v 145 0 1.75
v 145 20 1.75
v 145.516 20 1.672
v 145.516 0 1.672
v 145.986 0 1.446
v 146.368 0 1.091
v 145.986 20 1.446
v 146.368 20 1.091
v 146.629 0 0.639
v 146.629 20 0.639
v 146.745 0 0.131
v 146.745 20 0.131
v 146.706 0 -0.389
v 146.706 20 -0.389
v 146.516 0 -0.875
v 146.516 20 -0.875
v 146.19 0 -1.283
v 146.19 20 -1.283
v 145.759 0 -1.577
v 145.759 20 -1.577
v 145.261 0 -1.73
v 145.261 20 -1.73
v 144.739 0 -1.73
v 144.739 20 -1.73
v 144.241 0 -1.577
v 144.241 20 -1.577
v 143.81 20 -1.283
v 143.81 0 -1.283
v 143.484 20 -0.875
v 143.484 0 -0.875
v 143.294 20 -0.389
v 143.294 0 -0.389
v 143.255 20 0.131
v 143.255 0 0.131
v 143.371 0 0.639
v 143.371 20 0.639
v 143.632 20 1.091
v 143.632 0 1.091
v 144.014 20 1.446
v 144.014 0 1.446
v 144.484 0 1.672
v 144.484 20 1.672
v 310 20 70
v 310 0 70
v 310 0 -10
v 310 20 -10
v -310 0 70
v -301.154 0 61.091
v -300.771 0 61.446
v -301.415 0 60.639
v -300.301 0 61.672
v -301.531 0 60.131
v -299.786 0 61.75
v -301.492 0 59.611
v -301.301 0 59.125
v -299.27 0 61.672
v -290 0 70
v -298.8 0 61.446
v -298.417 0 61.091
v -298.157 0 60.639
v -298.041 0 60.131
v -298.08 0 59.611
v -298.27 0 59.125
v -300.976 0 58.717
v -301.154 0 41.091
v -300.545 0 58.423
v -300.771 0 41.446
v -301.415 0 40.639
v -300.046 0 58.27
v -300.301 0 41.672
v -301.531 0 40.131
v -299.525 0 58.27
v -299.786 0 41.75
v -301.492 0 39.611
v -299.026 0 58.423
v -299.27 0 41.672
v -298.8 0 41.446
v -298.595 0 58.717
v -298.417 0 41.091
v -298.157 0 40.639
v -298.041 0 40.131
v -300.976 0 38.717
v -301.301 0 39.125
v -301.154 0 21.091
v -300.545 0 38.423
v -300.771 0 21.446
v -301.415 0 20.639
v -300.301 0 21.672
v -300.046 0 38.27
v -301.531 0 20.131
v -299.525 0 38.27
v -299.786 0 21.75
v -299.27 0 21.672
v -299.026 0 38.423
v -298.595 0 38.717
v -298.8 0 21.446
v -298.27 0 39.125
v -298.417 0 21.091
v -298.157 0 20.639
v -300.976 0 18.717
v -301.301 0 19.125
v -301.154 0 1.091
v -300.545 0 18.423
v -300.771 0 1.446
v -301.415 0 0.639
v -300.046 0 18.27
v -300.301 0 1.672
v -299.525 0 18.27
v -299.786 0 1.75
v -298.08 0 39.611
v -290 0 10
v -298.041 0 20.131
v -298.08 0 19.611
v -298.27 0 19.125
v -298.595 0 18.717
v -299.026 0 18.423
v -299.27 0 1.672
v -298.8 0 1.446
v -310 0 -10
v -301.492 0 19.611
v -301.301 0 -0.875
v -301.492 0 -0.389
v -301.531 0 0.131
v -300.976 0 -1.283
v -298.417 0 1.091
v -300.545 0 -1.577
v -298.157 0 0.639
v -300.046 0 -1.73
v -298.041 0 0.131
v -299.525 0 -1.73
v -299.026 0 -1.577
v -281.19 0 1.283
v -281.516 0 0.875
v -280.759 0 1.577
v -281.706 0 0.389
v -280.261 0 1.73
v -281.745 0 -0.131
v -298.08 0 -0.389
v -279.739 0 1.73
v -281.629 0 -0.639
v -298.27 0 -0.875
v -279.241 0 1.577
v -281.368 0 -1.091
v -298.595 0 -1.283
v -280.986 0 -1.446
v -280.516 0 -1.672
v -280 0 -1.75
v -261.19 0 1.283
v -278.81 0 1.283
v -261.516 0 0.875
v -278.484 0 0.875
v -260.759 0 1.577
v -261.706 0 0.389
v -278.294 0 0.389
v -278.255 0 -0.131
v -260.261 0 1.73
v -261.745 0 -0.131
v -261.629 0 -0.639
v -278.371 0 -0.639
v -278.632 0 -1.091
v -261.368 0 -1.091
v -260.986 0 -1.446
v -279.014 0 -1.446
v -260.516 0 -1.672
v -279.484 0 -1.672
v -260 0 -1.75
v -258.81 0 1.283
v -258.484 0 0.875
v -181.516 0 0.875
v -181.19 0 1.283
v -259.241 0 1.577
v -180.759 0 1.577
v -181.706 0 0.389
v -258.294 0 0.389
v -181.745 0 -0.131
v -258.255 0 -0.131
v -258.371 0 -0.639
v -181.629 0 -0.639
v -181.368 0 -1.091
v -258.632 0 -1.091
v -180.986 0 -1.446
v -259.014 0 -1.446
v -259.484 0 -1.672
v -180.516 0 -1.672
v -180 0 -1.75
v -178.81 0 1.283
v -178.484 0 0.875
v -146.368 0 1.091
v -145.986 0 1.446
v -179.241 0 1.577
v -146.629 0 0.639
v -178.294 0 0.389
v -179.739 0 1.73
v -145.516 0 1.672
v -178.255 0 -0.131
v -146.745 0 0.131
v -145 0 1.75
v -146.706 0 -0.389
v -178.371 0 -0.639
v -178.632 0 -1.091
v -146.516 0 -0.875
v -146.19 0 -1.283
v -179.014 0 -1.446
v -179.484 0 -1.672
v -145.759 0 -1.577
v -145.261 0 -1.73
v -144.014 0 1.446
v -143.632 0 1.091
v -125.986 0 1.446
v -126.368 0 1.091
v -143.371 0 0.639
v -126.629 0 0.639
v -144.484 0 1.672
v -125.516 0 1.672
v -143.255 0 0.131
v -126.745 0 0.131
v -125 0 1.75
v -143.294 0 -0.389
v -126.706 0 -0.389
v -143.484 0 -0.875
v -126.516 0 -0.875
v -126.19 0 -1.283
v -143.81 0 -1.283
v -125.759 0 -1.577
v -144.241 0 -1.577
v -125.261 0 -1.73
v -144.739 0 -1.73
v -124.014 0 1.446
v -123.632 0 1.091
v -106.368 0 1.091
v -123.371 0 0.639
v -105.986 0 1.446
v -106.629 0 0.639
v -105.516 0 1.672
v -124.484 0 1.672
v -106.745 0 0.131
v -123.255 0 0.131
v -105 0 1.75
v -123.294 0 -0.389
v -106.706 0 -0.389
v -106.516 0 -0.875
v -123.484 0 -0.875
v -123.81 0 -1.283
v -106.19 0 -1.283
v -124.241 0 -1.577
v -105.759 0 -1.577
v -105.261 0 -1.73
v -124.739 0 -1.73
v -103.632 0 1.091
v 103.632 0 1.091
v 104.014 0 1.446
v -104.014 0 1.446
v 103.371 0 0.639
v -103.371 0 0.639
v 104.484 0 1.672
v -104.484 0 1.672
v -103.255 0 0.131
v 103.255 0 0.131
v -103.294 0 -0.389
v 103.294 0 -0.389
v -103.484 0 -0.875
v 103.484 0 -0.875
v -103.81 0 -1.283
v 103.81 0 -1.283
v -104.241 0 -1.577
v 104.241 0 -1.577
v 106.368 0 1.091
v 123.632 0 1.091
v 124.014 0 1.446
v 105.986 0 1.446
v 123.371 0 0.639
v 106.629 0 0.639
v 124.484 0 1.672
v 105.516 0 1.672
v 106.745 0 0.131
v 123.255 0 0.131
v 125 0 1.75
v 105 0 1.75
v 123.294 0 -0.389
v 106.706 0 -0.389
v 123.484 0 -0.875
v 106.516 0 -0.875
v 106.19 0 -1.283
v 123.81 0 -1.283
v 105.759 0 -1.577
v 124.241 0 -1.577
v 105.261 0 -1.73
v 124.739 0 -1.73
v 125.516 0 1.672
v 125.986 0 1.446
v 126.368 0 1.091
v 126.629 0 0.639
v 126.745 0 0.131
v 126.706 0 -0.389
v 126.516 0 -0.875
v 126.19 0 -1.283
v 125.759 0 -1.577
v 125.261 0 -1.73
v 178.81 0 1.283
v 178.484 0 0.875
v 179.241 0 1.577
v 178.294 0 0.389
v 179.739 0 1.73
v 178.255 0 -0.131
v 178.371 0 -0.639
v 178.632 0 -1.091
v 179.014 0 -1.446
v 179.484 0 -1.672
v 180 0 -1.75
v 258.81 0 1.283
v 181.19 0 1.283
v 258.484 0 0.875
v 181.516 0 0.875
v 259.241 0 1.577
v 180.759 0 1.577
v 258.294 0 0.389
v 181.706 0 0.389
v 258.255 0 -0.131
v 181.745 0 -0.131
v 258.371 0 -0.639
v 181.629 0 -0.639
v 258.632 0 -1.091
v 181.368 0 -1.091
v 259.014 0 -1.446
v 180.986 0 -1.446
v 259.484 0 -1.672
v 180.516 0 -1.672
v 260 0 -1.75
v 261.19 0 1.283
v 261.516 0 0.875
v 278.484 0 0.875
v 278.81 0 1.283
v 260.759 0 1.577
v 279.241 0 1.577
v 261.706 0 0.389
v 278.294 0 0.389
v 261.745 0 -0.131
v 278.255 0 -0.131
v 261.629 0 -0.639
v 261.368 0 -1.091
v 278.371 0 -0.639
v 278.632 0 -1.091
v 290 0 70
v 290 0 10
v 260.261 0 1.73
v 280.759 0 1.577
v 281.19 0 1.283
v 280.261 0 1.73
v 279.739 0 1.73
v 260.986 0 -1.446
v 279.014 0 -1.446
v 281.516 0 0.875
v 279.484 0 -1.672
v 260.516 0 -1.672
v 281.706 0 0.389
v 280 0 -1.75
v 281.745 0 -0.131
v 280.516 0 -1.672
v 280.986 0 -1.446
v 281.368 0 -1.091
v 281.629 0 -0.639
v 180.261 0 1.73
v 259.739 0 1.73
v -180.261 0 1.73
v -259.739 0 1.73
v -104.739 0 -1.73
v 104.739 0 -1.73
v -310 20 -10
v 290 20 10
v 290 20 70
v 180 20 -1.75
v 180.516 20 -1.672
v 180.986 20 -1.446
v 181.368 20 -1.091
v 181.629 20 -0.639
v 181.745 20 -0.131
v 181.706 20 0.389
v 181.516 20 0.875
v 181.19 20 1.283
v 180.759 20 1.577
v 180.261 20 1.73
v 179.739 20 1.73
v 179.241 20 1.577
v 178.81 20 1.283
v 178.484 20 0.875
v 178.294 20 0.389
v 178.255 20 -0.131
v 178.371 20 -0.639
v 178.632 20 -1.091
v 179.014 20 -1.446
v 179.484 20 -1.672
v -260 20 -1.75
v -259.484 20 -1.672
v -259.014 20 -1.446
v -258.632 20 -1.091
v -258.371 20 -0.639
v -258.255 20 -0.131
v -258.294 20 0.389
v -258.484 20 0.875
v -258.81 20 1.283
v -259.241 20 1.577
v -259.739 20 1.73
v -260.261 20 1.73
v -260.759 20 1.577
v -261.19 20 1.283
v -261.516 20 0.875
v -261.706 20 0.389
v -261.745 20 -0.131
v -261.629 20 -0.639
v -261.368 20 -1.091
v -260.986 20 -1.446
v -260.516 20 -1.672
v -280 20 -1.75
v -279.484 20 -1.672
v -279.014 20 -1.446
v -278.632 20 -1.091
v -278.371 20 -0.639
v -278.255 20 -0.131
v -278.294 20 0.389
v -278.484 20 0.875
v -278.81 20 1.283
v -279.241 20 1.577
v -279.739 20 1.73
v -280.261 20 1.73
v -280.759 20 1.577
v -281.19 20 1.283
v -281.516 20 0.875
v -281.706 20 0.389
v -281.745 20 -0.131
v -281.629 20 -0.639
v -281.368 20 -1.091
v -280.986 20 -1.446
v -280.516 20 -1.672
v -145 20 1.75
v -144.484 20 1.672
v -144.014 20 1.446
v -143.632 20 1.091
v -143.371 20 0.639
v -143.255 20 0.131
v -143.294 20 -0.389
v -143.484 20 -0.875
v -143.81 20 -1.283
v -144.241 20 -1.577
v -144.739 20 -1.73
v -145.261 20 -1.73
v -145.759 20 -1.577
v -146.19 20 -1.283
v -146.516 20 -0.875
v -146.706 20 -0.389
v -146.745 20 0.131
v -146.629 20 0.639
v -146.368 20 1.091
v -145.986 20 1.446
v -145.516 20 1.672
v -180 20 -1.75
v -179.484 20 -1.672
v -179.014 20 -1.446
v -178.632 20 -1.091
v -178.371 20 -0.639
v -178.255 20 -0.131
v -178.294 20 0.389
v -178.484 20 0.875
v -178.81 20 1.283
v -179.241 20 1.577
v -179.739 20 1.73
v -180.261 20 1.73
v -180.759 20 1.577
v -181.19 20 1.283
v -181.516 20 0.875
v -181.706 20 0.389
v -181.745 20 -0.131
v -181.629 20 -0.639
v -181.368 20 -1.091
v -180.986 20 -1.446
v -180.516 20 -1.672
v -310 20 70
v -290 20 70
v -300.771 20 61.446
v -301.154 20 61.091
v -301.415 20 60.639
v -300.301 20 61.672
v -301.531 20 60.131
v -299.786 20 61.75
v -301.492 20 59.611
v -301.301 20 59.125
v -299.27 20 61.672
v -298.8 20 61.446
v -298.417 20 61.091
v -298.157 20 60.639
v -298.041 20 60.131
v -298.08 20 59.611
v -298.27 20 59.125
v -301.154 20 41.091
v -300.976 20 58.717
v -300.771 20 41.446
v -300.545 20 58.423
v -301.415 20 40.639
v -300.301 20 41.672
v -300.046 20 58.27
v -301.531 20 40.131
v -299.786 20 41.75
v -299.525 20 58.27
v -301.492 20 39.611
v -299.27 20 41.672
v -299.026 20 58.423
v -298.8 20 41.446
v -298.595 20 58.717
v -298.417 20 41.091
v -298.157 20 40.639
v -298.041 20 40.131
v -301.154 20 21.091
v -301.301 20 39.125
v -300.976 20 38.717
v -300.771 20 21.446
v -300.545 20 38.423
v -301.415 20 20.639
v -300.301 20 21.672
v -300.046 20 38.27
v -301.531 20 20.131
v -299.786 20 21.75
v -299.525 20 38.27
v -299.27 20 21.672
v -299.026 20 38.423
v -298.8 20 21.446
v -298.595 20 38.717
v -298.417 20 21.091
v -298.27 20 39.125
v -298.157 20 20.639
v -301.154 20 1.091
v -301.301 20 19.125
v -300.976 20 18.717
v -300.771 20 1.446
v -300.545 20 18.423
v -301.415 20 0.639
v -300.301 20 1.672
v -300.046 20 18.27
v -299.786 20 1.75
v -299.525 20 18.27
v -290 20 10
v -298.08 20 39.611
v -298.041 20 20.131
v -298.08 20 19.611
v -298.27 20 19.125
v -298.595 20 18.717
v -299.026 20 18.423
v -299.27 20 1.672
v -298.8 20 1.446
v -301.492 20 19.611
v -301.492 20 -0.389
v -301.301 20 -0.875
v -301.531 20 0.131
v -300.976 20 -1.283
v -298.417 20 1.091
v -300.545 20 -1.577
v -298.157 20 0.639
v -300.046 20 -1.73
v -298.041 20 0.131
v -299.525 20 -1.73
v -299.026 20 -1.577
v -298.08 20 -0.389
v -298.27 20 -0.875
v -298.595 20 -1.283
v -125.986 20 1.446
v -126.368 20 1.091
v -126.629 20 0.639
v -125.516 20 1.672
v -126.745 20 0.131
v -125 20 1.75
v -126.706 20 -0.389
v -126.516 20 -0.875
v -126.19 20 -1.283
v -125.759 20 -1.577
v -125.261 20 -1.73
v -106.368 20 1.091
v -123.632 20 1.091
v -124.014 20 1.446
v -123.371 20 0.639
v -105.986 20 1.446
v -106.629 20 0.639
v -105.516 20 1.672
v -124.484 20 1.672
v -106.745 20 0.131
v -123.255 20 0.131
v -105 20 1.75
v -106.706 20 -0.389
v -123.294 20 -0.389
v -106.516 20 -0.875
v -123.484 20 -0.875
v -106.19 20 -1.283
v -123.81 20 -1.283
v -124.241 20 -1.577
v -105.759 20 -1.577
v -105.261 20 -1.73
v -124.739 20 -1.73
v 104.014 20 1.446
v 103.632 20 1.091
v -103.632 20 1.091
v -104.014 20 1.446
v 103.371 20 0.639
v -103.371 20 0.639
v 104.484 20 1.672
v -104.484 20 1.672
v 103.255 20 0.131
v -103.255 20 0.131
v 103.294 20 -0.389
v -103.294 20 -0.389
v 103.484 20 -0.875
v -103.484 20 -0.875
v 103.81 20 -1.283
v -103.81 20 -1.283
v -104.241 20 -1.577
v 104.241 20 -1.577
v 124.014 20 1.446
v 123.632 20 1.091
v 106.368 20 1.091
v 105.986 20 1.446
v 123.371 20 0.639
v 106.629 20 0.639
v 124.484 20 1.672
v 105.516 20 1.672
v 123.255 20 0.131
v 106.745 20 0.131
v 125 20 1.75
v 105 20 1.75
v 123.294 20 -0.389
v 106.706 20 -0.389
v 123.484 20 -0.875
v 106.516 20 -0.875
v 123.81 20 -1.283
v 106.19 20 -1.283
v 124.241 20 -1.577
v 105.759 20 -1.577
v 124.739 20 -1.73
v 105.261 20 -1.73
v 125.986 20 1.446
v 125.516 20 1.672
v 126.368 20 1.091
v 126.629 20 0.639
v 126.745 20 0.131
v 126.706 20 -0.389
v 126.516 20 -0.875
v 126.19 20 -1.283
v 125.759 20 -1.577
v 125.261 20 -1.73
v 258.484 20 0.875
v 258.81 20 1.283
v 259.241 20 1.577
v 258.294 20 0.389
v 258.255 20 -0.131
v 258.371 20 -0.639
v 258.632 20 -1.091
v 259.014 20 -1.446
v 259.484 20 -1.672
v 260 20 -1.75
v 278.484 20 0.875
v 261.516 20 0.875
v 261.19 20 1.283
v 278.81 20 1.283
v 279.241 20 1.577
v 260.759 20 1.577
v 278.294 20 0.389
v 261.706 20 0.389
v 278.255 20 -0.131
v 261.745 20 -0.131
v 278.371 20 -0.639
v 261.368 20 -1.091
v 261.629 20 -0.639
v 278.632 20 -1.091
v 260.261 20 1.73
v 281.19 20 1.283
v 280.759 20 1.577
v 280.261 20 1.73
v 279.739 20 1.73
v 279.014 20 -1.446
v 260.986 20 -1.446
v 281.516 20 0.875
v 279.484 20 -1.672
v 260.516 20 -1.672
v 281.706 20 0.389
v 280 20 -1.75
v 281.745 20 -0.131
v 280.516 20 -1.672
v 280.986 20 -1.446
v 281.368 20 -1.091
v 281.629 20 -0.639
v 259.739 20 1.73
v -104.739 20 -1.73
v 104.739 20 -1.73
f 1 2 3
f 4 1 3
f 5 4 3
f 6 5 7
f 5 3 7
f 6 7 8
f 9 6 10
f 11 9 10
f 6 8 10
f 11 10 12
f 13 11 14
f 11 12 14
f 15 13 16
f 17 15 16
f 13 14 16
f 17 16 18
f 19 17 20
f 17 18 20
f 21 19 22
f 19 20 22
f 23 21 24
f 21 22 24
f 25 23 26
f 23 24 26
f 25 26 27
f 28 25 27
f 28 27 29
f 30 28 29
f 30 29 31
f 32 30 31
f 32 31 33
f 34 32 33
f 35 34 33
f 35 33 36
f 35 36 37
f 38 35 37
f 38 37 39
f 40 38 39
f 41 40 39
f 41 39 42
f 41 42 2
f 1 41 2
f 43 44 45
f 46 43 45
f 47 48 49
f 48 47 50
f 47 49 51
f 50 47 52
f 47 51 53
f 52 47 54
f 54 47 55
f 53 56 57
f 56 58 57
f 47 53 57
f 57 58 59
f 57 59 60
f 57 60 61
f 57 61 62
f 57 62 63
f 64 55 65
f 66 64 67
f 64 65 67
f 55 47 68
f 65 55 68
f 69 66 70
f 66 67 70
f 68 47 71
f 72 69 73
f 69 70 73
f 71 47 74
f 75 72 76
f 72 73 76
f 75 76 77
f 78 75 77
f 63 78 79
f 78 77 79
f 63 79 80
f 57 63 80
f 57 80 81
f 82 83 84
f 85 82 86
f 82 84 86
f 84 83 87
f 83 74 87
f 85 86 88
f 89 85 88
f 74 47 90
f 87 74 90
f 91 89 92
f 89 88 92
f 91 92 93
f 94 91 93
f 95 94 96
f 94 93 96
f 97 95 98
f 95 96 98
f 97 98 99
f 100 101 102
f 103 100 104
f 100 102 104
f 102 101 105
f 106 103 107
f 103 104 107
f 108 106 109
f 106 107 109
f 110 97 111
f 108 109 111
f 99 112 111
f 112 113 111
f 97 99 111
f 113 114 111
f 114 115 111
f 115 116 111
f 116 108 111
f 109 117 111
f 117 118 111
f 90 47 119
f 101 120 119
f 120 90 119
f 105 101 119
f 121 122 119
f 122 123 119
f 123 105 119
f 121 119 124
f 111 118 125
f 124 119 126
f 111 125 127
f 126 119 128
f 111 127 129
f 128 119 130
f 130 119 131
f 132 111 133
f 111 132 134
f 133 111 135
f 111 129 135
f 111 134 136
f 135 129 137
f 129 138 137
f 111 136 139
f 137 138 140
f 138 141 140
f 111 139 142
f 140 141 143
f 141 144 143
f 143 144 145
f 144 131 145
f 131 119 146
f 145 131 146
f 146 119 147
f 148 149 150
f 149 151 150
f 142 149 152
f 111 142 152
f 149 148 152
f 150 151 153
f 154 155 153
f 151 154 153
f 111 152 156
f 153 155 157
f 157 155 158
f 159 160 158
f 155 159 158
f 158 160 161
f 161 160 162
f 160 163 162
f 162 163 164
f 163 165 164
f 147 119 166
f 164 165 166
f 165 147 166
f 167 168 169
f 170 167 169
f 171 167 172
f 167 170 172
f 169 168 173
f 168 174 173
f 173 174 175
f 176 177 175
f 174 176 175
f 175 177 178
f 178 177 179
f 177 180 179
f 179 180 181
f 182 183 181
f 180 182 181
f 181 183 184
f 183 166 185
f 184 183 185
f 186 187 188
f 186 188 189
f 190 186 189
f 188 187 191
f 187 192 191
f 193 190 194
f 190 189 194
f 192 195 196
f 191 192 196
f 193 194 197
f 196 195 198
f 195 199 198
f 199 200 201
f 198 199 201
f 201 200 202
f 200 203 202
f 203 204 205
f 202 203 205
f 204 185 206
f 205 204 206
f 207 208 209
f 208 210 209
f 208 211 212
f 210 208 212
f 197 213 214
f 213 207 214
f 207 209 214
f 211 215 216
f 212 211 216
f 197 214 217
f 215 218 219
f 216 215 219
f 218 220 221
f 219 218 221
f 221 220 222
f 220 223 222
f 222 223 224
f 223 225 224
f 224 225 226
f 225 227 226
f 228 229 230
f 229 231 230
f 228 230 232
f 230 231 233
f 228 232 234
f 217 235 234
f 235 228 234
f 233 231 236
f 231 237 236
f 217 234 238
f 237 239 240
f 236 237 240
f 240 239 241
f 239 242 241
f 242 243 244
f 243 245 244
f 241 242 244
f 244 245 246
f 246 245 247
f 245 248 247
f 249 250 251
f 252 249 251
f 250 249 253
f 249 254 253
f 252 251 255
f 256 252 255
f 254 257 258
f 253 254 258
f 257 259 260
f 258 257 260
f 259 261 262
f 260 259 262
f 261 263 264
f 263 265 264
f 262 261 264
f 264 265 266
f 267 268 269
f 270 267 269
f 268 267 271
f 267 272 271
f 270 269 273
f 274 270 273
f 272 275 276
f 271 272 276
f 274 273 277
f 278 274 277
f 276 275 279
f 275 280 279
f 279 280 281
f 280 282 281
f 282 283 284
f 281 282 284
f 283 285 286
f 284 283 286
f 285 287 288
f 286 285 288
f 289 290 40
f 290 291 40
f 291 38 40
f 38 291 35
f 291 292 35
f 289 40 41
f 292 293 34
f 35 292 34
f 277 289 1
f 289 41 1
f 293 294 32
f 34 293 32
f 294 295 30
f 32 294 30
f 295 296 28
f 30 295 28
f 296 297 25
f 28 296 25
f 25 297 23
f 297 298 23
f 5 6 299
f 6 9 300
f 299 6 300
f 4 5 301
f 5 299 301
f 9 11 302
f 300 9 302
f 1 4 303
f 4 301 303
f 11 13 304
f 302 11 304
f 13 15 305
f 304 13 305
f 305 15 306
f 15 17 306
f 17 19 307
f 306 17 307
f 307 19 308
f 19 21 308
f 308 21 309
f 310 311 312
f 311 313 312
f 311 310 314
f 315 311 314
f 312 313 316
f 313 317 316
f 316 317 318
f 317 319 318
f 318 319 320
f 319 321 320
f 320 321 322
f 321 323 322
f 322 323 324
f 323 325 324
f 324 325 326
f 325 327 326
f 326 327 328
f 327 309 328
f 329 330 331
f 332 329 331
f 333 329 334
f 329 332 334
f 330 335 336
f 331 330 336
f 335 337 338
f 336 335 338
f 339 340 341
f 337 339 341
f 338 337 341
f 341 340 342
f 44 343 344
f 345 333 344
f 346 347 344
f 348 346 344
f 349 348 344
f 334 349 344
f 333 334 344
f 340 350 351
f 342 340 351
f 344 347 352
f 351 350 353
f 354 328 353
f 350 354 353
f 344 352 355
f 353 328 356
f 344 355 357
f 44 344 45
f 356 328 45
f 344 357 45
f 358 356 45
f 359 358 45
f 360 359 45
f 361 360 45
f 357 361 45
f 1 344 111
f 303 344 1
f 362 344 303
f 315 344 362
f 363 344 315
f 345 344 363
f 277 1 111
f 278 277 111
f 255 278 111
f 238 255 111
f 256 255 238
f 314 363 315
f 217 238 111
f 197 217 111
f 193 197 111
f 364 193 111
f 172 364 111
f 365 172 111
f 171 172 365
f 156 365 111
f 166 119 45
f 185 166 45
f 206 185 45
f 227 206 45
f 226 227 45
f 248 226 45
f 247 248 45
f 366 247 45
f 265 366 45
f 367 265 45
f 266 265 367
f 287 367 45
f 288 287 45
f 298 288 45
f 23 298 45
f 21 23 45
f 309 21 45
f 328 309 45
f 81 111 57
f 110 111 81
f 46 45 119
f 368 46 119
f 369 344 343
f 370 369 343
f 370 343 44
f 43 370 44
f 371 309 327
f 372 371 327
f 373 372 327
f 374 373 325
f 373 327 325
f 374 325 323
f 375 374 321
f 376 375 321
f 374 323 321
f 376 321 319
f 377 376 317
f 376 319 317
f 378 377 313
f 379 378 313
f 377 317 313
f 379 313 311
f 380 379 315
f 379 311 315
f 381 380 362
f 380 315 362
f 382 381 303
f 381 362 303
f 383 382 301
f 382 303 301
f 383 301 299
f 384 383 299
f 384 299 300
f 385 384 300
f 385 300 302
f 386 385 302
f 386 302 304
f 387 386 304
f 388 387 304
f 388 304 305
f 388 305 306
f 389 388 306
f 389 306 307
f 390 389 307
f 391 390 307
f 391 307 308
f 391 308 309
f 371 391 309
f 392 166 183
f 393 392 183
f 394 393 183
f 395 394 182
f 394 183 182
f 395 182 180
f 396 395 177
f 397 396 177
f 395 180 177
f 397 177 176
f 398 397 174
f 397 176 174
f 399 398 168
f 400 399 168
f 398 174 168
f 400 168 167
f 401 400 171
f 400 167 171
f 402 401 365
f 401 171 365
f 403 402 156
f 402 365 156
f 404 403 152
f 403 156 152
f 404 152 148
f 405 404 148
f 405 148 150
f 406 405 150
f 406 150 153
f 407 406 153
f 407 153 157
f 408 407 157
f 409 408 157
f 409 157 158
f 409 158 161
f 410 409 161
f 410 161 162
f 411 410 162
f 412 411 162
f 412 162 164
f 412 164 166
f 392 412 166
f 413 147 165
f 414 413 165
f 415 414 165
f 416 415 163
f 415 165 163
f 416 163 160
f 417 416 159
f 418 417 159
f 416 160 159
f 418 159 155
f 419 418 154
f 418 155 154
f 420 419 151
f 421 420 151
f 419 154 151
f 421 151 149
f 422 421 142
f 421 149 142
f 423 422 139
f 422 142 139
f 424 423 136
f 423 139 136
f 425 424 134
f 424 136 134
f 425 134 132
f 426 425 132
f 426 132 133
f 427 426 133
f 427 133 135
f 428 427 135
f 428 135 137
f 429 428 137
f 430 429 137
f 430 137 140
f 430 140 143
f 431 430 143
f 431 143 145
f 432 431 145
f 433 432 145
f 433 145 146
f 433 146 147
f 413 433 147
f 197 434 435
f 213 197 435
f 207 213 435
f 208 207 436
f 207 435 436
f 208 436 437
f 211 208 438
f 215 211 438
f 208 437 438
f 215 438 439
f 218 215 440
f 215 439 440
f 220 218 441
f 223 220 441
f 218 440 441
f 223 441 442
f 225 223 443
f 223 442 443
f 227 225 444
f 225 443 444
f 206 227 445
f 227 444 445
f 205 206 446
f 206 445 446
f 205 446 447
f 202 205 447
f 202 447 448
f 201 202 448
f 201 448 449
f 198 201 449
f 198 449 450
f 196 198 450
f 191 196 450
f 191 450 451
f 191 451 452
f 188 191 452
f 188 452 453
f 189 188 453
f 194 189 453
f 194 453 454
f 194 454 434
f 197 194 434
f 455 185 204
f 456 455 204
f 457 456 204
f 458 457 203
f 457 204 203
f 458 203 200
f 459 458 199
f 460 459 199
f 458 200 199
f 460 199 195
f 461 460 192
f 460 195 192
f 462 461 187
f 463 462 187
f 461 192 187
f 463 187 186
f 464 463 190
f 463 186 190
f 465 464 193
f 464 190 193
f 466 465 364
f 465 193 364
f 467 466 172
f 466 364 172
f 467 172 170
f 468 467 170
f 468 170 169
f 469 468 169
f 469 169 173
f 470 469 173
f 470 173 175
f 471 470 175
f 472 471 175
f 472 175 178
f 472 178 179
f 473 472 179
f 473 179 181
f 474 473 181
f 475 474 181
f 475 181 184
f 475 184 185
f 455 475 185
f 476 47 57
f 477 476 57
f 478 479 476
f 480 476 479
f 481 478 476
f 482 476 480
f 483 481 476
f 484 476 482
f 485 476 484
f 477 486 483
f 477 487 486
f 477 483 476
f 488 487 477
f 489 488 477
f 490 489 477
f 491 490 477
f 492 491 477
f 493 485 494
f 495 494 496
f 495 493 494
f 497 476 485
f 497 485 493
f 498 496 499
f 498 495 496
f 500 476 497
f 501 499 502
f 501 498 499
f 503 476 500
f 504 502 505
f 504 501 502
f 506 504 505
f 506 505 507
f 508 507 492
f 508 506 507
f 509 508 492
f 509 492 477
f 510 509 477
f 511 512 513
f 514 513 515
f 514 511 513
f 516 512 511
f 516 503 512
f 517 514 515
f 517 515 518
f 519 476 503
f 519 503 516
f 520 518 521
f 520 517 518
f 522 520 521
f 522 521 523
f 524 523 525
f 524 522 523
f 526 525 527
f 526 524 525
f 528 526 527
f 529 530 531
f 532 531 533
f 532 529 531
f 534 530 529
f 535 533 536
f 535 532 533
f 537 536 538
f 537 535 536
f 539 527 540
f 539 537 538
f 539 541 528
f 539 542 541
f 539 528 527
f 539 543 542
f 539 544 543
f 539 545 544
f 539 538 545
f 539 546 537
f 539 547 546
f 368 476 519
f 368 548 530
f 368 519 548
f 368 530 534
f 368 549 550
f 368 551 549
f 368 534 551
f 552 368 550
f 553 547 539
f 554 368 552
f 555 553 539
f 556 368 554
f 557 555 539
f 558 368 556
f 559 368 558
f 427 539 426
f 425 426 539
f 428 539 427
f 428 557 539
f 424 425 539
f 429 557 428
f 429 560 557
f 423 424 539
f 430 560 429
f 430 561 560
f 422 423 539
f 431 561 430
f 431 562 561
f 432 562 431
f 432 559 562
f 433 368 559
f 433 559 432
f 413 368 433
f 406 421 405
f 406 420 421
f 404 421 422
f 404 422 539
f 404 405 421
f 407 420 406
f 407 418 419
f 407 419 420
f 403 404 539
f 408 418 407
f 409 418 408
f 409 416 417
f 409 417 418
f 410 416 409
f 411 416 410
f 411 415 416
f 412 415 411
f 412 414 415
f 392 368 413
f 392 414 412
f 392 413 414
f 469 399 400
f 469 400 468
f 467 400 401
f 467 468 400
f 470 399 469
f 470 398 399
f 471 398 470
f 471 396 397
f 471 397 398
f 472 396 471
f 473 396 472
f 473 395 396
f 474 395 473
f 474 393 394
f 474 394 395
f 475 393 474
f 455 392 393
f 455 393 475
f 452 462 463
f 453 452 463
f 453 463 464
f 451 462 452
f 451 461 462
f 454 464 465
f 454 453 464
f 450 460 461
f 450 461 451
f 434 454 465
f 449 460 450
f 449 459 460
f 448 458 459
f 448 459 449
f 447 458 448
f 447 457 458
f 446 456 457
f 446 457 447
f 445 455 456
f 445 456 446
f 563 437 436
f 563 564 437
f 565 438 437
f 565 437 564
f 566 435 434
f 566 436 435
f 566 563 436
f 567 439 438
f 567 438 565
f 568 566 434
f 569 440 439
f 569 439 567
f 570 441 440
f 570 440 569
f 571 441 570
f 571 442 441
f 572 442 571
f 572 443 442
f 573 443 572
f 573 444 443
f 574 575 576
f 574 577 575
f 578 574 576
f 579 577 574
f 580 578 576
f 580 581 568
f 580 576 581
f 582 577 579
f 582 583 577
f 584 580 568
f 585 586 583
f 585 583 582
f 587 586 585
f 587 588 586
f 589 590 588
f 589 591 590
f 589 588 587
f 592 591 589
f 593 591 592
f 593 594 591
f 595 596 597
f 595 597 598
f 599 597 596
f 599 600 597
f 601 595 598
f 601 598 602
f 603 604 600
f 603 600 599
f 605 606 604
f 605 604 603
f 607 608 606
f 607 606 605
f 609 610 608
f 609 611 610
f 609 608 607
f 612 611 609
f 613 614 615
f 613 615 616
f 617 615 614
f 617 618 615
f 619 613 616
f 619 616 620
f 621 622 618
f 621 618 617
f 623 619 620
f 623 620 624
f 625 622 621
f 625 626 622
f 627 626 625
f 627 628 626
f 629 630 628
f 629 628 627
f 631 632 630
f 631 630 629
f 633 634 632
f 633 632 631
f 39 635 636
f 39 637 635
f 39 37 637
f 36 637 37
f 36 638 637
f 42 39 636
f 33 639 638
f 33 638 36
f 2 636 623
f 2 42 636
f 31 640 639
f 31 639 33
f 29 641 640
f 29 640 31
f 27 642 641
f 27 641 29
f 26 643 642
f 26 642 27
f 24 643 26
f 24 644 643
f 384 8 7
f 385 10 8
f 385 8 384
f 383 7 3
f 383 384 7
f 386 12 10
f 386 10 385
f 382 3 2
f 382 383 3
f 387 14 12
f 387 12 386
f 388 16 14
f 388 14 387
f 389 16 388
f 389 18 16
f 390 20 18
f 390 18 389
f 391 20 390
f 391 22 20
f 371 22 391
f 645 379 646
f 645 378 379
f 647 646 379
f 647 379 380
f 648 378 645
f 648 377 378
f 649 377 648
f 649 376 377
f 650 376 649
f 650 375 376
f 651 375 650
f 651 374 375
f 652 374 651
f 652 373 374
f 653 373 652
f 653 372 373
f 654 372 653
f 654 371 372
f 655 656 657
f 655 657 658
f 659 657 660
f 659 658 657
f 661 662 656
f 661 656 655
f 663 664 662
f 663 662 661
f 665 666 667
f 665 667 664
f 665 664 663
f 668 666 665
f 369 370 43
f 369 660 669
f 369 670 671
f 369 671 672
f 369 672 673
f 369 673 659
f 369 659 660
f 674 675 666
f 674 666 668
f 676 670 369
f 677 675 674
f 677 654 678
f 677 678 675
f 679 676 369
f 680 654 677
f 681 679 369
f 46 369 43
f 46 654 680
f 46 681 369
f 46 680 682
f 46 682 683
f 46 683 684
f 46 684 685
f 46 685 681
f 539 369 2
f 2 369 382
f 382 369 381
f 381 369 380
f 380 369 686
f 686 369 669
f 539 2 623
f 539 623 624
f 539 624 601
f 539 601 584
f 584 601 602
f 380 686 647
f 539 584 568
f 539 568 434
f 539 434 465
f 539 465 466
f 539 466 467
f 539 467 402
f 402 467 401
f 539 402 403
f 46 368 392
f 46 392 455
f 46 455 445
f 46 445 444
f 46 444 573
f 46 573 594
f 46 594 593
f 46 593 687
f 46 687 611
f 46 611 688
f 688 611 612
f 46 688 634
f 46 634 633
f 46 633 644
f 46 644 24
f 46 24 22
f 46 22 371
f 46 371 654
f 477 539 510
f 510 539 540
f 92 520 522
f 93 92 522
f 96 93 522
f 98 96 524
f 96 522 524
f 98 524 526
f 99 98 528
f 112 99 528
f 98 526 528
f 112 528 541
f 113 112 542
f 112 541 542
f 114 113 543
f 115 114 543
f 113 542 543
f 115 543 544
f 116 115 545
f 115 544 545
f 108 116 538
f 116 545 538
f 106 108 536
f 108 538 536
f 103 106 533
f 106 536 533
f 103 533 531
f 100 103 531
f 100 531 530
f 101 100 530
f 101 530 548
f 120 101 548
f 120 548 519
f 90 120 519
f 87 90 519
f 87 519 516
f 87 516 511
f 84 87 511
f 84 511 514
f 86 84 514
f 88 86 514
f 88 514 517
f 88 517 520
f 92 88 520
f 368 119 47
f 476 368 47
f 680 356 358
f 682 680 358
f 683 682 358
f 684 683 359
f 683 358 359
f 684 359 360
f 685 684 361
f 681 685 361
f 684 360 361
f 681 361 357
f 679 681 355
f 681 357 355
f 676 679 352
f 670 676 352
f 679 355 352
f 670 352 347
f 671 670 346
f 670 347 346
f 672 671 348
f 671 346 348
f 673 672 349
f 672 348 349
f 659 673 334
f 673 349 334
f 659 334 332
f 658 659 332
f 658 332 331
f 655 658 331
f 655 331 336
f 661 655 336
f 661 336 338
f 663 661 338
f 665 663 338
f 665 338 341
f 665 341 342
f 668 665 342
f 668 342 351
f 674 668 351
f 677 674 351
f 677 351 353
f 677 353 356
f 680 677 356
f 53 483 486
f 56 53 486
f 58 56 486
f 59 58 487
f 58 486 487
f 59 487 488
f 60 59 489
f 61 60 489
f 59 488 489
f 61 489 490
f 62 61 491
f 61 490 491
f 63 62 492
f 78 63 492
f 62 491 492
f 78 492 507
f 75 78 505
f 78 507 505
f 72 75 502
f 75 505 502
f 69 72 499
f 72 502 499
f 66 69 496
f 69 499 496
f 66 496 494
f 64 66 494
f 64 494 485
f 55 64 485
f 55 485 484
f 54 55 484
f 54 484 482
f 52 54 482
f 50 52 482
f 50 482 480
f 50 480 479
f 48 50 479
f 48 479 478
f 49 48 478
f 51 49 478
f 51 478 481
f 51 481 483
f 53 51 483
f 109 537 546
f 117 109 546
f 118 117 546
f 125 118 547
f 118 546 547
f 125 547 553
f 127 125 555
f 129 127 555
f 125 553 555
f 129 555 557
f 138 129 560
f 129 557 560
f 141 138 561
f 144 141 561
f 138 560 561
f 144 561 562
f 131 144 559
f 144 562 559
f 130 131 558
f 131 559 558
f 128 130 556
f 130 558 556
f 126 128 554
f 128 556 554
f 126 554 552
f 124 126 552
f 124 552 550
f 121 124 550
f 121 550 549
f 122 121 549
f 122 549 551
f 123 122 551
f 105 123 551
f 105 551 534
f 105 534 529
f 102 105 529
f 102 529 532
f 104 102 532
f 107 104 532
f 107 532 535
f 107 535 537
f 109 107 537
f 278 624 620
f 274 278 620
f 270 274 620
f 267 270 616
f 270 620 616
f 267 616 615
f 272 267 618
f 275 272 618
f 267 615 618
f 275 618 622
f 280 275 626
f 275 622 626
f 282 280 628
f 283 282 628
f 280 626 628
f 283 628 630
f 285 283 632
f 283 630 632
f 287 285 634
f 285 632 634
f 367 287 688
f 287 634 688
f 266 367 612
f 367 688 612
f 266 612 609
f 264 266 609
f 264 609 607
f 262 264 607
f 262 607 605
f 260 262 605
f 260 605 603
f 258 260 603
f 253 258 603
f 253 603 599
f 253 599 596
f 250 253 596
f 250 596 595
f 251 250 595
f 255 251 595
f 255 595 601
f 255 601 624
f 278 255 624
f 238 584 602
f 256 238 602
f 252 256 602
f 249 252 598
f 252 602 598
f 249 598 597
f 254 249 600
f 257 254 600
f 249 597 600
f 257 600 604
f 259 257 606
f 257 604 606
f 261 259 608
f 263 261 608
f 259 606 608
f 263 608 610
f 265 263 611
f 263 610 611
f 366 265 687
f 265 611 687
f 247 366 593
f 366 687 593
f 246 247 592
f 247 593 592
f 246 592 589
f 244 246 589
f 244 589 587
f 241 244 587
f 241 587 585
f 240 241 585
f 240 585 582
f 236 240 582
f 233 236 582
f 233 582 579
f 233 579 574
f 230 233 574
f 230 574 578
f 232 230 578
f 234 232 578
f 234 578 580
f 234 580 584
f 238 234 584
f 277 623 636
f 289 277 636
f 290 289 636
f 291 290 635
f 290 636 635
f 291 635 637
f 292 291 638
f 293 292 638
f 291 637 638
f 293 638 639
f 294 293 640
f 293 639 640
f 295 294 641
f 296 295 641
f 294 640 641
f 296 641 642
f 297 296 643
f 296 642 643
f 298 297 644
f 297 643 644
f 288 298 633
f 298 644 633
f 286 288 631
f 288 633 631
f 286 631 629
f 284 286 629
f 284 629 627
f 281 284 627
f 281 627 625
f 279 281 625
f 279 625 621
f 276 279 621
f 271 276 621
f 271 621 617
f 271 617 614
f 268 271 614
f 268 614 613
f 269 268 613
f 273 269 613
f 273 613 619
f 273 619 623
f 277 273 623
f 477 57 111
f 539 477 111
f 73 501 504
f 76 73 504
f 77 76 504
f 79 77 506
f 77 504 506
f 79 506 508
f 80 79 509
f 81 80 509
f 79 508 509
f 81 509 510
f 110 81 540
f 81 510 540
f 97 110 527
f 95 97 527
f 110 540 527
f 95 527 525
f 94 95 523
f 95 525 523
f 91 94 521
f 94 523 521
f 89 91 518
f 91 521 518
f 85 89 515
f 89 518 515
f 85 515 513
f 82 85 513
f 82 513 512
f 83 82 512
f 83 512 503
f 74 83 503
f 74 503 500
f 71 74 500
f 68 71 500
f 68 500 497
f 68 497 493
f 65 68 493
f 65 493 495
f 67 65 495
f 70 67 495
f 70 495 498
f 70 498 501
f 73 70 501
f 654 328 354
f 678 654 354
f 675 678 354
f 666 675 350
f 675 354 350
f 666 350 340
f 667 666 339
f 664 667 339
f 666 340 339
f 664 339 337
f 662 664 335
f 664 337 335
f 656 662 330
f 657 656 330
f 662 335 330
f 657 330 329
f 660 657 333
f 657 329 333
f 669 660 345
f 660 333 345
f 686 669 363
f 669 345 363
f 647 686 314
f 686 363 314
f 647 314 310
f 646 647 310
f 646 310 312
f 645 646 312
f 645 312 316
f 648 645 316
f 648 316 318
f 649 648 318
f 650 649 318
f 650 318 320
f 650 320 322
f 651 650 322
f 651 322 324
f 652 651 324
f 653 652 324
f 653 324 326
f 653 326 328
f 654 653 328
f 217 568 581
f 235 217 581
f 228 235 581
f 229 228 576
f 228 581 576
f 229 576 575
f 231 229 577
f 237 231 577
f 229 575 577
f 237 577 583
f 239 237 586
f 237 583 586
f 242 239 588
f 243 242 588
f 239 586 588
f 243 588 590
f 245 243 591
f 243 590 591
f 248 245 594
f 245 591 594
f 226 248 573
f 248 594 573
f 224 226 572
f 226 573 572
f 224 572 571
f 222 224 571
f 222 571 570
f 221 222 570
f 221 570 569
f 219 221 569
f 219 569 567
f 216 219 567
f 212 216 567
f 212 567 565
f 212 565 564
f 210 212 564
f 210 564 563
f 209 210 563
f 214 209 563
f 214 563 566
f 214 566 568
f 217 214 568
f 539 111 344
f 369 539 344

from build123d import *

# Parameters (mm, degrees)
SKETCH_1_W          = 580
SKETCH_1_H          = 20
EXTRUDE_1_DEPTH     = 20
CUT_EXTRUDE_1_REACH = 320.434
SKETCH_2_R          = 1.75
CUT_EXTRUDE_2_REACH = 320.434
SKETCH_4_R          = 1.75
CUT_EXTRUDE_3_REACH = 320.434
SKETCH_3_R          = 1.75


with BuildPart() as part:
    # 草图1 → 凸台-拉伸1 (new body)
    with BuildSketch(Plane(origin=(0, 0, 0), x_dir=(1, 0, 0), z_dir=(0, 1, 0))):
        Rectangle(SKETCH_1_W, SKETCH_1_H)
        Polygon((-290, -70), (-290, -10), (-290, 10), (-310, 10), (-310, -70), align=None)
        Polygon((290, 10), (290, -10), (290, -70), (310, -70), (310, 10), align=None)
    extrude(amount=EXTRUDE_1_DEPTH)

    # 草图2 → 切除-拉伸1 (cut, up to next)
    with BuildSketch(Plane(origin=(0, 20, 0), x_dir=(1, 0, 0), z_dir=(0, 1, 0)), mode=Mode.PRIVATE) as cut_extrude_1_sk1:
        with Locations(Location((-299.785666285, -40, 0), (0, 0, 270))):
            Circle(SKETCH_2_R)
    cut_extrude_1_tool1 = extrude(cut_extrude_1_sk1.sketch, amount=-CUT_EXTRUDE_1_REACH, mode=Mode.PRIVATE) & part.part
    # 草图2 → 切除-拉伸1 (cut, up to next)
    with BuildSketch(Plane(origin=(0, 20, 0), x_dir=(1, 0, 0), z_dir=(0, 1, 0)), mode=Mode.PRIVATE) as cut_extrude_1_sk2:
        with Locations(Location((-299.785666285, -60, 0), (0, 0, 270))):
            Circle(SKETCH_2_R)
    cut_extrude_1_tool2 = extrude(cut_extrude_1_sk2.sketch, amount=-CUT_EXTRUDE_1_REACH, mode=Mode.PRIVATE) & part.part
    # 草图2 → 切除-拉伸1 (cut, up to next)
    with BuildSketch(Plane(origin=(0, 20, 0), x_dir=(1, 0, 0), z_dir=(0, 1, 0)), mode=Mode.PRIVATE) as cut_extrude_1_sk3:
        with Locations(Location((-299.785666285, -20, 0), (0, 0, 270))):
            Circle(SKETCH_2_R)
    cut_extrude_1_tool3 = extrude(cut_extrude_1_sk3.sketch, amount=-CUT_EXTRUDE_1_REACH, mode=Mode.PRIVATE) & part.part
    # 草图2 → 切除-拉伸1 (cut, up to next)
    with BuildSketch(Plane(origin=(0, 20, 0), x_dir=(1, 0, 0), z_dir=(0, 1, 0)), mode=Mode.PRIVATE) as cut_extrude_1_sk4:
        with Locations(Location((-299.785666285, 0, 0), (0, 0, 270))):
            Circle(SKETCH_2_R)
    cut_extrude_1_tool4 = extrude(cut_extrude_1_sk4.sketch, amount=-CUT_EXTRUDE_1_REACH, mode=Mode.PRIVATE) & part.part
    add(cut_extrude_1_tool1.solids().sort_by_distance((-299.785666, 20, 40))[0], mode=Mode.SUBTRACT)
    add(cut_extrude_1_tool2.solids().sort_by_distance((-299.785666, 20, 60))[0], mode=Mode.SUBTRACT)
    add(cut_extrude_1_tool3.solids().sort_by_distance((-299.785666, 20, 20))[0], mode=Mode.SUBTRACT)
    add(cut_extrude_1_tool4.solids().sort_by_distance((-299.785666, 20, 0))[0], mode=Mode.SUBTRACT)

    # 草图4 → 切除-拉伸2 (cut, up to next)
    with BuildSketch(Plane(origin=(0, 20, 0), x_dir=(1, 0, 0), z_dir=(0, 1, 0)), mode=Mode.PRIVATE) as cut_extrude_2_sk1:
        with Locations(Location((-125, 0, 0), (0, 0, 270))):
            Circle(SKETCH_4_R)
    cut_extrude_2_tool1 = extrude(cut_extrude_2_sk1.sketch, amount=-CUT_EXTRUDE_2_REACH, mode=Mode.PRIVATE) & part.part
    # 草图4 → 切除-拉伸2 (cut, up to next)
    with BuildSketch(Plane(origin=(0, 20, 0), x_dir=(1, 0, 0), z_dir=(0, 1, 0)), mode=Mode.PRIVATE) as cut_extrude_2_sk2:
        with Locations(Location((-105, 0, 0), (0, 0, 270))):
            Circle(SKETCH_4_R)
    cut_extrude_2_tool2 = extrude(cut_extrude_2_sk2.sketch, amount=-CUT_EXTRUDE_2_REACH, mode=Mode.PRIVATE) & part.part
    # 草图4 → 切除-拉伸2 (cut, up to next)
    with BuildSketch(Plane(origin=(0, 20, 0), x_dir=(1, 0, 0), z_dir=(0, 1, 0)), mode=Mode.PRIVATE) as cut_extrude_2_sk3:
        with Locations(Location((-145, 0, 0), (0, 0, 270))):
            Circle(SKETCH_4_R)
    cut_extrude_2_tool3 = extrude(cut_extrude_2_sk3.sketch, amount=-CUT_EXTRUDE_2_REACH, mode=Mode.PRIVATE) & part.part
    # 草图4 → 切除-拉伸2 (cut, up to next)
    with BuildSketch(Plane(origin=(0, 20, 0), x_dir=(1, 0, 0), z_dir=(0, 1, 0)), mode=Mode.PRIVATE) as cut_extrude_2_sk4:
        with Locations(Location((105, 0, 0), (0, 0, 270))):
            Circle(SKETCH_4_R)
    cut_extrude_2_tool4 = extrude(cut_extrude_2_sk4.sketch, amount=-CUT_EXTRUDE_2_REACH, mode=Mode.PRIVATE) & part.part
    # 草图4 → 切除-拉伸2 (cut, up to next)
    with BuildSketch(Plane(origin=(0, 20, 0), x_dir=(1, 0, 0), z_dir=(0, 1, 0)), mode=Mode.PRIVATE) as cut_extrude_2_sk5:
        with Locations(Location((125, 0, 0), (0, 0, 270))):
            Circle(SKETCH_4_R)
    cut_extrude_2_tool5 = extrude(cut_extrude_2_sk5.sketch, amount=-CUT_EXTRUDE_2_REACH, mode=Mode.PRIVATE) & part.part
    # 草图4 → 切除-拉伸2 (cut, up to next)
    with BuildSketch(Plane(origin=(0, 20, 0), x_dir=(1, 0, 0), z_dir=(0, 1, 0)), mode=Mode.PRIVATE) as cut_extrude_2_sk6:
        with Locations(Location((145, 0, 0), (0, 0, 270))):
            Circle(SKETCH_4_R)
    cut_extrude_2_tool6 = extrude(cut_extrude_2_sk6.sketch, amount=-CUT_EXTRUDE_2_REACH, mode=Mode.PRIVATE) & part.part
    add(cut_extrude_2_tool1.solids().sort_by_distance((-125, 20, 0))[0], mode=Mode.SUBTRACT)
    add(cut_extrude_2_tool2.solids().sort_by_distance((-105, 20, 0))[0], mode=Mode.SUBTRACT)
    add(cut_extrude_2_tool3.solids().sort_by_distance((-145, 20, 0))[0], mode=Mode.SUBTRACT)
    add(cut_extrude_2_tool4.solids().sort_by_distance((105, 20, 0))[0], mode=Mode.SUBTRACT)
    add(cut_extrude_2_tool5.solids().sort_by_distance((125, 20, 0))[0], mode=Mode.SUBTRACT)
    add(cut_extrude_2_tool6.solids().sort_by_distance((145, 20, 0))[0], mode=Mode.SUBTRACT)

    # 草图3 → 切除-拉伸3 (cut, up to next)
    with BuildSketch(Plane.XZ, mode=Mode.PRIVATE) as cut_extrude_3_sk1:
        with Locations(Location((180, 0, 0), (0, 0, 270))):
            Circle(SKETCH_3_R)
    cut_extrude_3_tool1 = extrude(cut_extrude_3_sk1.sketch, amount=-CUT_EXTRUDE_3_REACH, mode=Mode.PRIVATE) & part.part
    # 草图3 → 切除-拉伸3 (cut, up to next)
    with BuildSketch(Plane.XZ, mode=Mode.PRIVATE) as cut_extrude_3_sk2:
        with Locations(Location((280, 0, 0), (0, 0, 270))):
            Circle(SKETCH_3_R)
    cut_extrude_3_tool2 = extrude(cut_extrude_3_sk2.sketch, amount=-CUT_EXTRUDE_3_REACH, mode=Mode.PRIVATE) & part.part
    # 草图3 → 切除-拉伸3 (cut, up to next)
    with BuildSketch(Plane.XZ, mode=Mode.PRIVATE) as cut_extrude_3_sk3:
        with Locations(Location((260, 0, 0), (0, 0, 270))):
            Circle(SKETCH_3_R)
    cut_extrude_3_tool3 = extrude(cut_extrude_3_sk3.sketch, amount=-CUT_EXTRUDE_3_REACH, mode=Mode.PRIVATE) & part.part
    # 草图3 → 切除-拉伸3 (cut, up to next)
    with BuildSketch(Plane.XZ, mode=Mode.PRIVATE) as cut_extrude_3_sk4:
        with Locations(Location((-280, 0, 0), (0, 0, 270))):
            Circle(SKETCH_3_R)
    cut_extrude_3_tool4 = extrude(cut_extrude_3_sk4.sketch, amount=-CUT_EXTRUDE_3_REACH, mode=Mode.PRIVATE) & part.part
    # 草图3 → 切除-拉伸3 (cut, up to next)
    with BuildSketch(Plane.XZ, mode=Mode.PRIVATE) as cut_extrude_3_sk5:
        with Locations(Location((-260, 0, 0), (0, 0, 270))):
            Circle(SKETCH_3_R)
    cut_extrude_3_tool5 = extrude(cut_extrude_3_sk5.sketch, amount=-CUT_EXTRUDE_3_REACH, mode=Mode.PRIVATE) & part.part
    # 草图3 → 切除-拉伸3 (cut, up to next)
    with BuildSketch(Plane.XZ, mode=Mode.PRIVATE) as cut_extrude_3_sk6:
        with Locations(Location((-180, 0, 0), (0, 0, 270))):
            Circle(SKETCH_3_R)
    cut_extrude_3_tool6 = extrude(cut_extrude_3_sk6.sketch, amount=-CUT_EXTRUDE_3_REACH, mode=Mode.PRIVATE) & part.part
    add(cut_extrude_3_tool1.solids().sort_by_distance((180, 0, 0))[0], mode=Mode.SUBTRACT)
    add(cut_extrude_3_tool2.solids().sort_by_distance((280, 0, 0))[0], mode=Mode.SUBTRACT)
    add(cut_extrude_3_tool3.solids().sort_by_distance((260, 0, 0))[0], mode=Mode.SUBTRACT)
    add(cut_extrude_3_tool4.solids().sort_by_distance((-280, 0, 0))[0], mode=Mode.SUBTRACT)
    add(cut_extrude_3_tool5.solids().sort_by_distance((-260, 0, 0))[0], mode=Mode.SUBTRACT)
    add(cut_extrude_3_tool6.solids().sort_by_distance((-180, 0, 0))[0], mode=Mode.SUBTRACT)


solid = part.part
